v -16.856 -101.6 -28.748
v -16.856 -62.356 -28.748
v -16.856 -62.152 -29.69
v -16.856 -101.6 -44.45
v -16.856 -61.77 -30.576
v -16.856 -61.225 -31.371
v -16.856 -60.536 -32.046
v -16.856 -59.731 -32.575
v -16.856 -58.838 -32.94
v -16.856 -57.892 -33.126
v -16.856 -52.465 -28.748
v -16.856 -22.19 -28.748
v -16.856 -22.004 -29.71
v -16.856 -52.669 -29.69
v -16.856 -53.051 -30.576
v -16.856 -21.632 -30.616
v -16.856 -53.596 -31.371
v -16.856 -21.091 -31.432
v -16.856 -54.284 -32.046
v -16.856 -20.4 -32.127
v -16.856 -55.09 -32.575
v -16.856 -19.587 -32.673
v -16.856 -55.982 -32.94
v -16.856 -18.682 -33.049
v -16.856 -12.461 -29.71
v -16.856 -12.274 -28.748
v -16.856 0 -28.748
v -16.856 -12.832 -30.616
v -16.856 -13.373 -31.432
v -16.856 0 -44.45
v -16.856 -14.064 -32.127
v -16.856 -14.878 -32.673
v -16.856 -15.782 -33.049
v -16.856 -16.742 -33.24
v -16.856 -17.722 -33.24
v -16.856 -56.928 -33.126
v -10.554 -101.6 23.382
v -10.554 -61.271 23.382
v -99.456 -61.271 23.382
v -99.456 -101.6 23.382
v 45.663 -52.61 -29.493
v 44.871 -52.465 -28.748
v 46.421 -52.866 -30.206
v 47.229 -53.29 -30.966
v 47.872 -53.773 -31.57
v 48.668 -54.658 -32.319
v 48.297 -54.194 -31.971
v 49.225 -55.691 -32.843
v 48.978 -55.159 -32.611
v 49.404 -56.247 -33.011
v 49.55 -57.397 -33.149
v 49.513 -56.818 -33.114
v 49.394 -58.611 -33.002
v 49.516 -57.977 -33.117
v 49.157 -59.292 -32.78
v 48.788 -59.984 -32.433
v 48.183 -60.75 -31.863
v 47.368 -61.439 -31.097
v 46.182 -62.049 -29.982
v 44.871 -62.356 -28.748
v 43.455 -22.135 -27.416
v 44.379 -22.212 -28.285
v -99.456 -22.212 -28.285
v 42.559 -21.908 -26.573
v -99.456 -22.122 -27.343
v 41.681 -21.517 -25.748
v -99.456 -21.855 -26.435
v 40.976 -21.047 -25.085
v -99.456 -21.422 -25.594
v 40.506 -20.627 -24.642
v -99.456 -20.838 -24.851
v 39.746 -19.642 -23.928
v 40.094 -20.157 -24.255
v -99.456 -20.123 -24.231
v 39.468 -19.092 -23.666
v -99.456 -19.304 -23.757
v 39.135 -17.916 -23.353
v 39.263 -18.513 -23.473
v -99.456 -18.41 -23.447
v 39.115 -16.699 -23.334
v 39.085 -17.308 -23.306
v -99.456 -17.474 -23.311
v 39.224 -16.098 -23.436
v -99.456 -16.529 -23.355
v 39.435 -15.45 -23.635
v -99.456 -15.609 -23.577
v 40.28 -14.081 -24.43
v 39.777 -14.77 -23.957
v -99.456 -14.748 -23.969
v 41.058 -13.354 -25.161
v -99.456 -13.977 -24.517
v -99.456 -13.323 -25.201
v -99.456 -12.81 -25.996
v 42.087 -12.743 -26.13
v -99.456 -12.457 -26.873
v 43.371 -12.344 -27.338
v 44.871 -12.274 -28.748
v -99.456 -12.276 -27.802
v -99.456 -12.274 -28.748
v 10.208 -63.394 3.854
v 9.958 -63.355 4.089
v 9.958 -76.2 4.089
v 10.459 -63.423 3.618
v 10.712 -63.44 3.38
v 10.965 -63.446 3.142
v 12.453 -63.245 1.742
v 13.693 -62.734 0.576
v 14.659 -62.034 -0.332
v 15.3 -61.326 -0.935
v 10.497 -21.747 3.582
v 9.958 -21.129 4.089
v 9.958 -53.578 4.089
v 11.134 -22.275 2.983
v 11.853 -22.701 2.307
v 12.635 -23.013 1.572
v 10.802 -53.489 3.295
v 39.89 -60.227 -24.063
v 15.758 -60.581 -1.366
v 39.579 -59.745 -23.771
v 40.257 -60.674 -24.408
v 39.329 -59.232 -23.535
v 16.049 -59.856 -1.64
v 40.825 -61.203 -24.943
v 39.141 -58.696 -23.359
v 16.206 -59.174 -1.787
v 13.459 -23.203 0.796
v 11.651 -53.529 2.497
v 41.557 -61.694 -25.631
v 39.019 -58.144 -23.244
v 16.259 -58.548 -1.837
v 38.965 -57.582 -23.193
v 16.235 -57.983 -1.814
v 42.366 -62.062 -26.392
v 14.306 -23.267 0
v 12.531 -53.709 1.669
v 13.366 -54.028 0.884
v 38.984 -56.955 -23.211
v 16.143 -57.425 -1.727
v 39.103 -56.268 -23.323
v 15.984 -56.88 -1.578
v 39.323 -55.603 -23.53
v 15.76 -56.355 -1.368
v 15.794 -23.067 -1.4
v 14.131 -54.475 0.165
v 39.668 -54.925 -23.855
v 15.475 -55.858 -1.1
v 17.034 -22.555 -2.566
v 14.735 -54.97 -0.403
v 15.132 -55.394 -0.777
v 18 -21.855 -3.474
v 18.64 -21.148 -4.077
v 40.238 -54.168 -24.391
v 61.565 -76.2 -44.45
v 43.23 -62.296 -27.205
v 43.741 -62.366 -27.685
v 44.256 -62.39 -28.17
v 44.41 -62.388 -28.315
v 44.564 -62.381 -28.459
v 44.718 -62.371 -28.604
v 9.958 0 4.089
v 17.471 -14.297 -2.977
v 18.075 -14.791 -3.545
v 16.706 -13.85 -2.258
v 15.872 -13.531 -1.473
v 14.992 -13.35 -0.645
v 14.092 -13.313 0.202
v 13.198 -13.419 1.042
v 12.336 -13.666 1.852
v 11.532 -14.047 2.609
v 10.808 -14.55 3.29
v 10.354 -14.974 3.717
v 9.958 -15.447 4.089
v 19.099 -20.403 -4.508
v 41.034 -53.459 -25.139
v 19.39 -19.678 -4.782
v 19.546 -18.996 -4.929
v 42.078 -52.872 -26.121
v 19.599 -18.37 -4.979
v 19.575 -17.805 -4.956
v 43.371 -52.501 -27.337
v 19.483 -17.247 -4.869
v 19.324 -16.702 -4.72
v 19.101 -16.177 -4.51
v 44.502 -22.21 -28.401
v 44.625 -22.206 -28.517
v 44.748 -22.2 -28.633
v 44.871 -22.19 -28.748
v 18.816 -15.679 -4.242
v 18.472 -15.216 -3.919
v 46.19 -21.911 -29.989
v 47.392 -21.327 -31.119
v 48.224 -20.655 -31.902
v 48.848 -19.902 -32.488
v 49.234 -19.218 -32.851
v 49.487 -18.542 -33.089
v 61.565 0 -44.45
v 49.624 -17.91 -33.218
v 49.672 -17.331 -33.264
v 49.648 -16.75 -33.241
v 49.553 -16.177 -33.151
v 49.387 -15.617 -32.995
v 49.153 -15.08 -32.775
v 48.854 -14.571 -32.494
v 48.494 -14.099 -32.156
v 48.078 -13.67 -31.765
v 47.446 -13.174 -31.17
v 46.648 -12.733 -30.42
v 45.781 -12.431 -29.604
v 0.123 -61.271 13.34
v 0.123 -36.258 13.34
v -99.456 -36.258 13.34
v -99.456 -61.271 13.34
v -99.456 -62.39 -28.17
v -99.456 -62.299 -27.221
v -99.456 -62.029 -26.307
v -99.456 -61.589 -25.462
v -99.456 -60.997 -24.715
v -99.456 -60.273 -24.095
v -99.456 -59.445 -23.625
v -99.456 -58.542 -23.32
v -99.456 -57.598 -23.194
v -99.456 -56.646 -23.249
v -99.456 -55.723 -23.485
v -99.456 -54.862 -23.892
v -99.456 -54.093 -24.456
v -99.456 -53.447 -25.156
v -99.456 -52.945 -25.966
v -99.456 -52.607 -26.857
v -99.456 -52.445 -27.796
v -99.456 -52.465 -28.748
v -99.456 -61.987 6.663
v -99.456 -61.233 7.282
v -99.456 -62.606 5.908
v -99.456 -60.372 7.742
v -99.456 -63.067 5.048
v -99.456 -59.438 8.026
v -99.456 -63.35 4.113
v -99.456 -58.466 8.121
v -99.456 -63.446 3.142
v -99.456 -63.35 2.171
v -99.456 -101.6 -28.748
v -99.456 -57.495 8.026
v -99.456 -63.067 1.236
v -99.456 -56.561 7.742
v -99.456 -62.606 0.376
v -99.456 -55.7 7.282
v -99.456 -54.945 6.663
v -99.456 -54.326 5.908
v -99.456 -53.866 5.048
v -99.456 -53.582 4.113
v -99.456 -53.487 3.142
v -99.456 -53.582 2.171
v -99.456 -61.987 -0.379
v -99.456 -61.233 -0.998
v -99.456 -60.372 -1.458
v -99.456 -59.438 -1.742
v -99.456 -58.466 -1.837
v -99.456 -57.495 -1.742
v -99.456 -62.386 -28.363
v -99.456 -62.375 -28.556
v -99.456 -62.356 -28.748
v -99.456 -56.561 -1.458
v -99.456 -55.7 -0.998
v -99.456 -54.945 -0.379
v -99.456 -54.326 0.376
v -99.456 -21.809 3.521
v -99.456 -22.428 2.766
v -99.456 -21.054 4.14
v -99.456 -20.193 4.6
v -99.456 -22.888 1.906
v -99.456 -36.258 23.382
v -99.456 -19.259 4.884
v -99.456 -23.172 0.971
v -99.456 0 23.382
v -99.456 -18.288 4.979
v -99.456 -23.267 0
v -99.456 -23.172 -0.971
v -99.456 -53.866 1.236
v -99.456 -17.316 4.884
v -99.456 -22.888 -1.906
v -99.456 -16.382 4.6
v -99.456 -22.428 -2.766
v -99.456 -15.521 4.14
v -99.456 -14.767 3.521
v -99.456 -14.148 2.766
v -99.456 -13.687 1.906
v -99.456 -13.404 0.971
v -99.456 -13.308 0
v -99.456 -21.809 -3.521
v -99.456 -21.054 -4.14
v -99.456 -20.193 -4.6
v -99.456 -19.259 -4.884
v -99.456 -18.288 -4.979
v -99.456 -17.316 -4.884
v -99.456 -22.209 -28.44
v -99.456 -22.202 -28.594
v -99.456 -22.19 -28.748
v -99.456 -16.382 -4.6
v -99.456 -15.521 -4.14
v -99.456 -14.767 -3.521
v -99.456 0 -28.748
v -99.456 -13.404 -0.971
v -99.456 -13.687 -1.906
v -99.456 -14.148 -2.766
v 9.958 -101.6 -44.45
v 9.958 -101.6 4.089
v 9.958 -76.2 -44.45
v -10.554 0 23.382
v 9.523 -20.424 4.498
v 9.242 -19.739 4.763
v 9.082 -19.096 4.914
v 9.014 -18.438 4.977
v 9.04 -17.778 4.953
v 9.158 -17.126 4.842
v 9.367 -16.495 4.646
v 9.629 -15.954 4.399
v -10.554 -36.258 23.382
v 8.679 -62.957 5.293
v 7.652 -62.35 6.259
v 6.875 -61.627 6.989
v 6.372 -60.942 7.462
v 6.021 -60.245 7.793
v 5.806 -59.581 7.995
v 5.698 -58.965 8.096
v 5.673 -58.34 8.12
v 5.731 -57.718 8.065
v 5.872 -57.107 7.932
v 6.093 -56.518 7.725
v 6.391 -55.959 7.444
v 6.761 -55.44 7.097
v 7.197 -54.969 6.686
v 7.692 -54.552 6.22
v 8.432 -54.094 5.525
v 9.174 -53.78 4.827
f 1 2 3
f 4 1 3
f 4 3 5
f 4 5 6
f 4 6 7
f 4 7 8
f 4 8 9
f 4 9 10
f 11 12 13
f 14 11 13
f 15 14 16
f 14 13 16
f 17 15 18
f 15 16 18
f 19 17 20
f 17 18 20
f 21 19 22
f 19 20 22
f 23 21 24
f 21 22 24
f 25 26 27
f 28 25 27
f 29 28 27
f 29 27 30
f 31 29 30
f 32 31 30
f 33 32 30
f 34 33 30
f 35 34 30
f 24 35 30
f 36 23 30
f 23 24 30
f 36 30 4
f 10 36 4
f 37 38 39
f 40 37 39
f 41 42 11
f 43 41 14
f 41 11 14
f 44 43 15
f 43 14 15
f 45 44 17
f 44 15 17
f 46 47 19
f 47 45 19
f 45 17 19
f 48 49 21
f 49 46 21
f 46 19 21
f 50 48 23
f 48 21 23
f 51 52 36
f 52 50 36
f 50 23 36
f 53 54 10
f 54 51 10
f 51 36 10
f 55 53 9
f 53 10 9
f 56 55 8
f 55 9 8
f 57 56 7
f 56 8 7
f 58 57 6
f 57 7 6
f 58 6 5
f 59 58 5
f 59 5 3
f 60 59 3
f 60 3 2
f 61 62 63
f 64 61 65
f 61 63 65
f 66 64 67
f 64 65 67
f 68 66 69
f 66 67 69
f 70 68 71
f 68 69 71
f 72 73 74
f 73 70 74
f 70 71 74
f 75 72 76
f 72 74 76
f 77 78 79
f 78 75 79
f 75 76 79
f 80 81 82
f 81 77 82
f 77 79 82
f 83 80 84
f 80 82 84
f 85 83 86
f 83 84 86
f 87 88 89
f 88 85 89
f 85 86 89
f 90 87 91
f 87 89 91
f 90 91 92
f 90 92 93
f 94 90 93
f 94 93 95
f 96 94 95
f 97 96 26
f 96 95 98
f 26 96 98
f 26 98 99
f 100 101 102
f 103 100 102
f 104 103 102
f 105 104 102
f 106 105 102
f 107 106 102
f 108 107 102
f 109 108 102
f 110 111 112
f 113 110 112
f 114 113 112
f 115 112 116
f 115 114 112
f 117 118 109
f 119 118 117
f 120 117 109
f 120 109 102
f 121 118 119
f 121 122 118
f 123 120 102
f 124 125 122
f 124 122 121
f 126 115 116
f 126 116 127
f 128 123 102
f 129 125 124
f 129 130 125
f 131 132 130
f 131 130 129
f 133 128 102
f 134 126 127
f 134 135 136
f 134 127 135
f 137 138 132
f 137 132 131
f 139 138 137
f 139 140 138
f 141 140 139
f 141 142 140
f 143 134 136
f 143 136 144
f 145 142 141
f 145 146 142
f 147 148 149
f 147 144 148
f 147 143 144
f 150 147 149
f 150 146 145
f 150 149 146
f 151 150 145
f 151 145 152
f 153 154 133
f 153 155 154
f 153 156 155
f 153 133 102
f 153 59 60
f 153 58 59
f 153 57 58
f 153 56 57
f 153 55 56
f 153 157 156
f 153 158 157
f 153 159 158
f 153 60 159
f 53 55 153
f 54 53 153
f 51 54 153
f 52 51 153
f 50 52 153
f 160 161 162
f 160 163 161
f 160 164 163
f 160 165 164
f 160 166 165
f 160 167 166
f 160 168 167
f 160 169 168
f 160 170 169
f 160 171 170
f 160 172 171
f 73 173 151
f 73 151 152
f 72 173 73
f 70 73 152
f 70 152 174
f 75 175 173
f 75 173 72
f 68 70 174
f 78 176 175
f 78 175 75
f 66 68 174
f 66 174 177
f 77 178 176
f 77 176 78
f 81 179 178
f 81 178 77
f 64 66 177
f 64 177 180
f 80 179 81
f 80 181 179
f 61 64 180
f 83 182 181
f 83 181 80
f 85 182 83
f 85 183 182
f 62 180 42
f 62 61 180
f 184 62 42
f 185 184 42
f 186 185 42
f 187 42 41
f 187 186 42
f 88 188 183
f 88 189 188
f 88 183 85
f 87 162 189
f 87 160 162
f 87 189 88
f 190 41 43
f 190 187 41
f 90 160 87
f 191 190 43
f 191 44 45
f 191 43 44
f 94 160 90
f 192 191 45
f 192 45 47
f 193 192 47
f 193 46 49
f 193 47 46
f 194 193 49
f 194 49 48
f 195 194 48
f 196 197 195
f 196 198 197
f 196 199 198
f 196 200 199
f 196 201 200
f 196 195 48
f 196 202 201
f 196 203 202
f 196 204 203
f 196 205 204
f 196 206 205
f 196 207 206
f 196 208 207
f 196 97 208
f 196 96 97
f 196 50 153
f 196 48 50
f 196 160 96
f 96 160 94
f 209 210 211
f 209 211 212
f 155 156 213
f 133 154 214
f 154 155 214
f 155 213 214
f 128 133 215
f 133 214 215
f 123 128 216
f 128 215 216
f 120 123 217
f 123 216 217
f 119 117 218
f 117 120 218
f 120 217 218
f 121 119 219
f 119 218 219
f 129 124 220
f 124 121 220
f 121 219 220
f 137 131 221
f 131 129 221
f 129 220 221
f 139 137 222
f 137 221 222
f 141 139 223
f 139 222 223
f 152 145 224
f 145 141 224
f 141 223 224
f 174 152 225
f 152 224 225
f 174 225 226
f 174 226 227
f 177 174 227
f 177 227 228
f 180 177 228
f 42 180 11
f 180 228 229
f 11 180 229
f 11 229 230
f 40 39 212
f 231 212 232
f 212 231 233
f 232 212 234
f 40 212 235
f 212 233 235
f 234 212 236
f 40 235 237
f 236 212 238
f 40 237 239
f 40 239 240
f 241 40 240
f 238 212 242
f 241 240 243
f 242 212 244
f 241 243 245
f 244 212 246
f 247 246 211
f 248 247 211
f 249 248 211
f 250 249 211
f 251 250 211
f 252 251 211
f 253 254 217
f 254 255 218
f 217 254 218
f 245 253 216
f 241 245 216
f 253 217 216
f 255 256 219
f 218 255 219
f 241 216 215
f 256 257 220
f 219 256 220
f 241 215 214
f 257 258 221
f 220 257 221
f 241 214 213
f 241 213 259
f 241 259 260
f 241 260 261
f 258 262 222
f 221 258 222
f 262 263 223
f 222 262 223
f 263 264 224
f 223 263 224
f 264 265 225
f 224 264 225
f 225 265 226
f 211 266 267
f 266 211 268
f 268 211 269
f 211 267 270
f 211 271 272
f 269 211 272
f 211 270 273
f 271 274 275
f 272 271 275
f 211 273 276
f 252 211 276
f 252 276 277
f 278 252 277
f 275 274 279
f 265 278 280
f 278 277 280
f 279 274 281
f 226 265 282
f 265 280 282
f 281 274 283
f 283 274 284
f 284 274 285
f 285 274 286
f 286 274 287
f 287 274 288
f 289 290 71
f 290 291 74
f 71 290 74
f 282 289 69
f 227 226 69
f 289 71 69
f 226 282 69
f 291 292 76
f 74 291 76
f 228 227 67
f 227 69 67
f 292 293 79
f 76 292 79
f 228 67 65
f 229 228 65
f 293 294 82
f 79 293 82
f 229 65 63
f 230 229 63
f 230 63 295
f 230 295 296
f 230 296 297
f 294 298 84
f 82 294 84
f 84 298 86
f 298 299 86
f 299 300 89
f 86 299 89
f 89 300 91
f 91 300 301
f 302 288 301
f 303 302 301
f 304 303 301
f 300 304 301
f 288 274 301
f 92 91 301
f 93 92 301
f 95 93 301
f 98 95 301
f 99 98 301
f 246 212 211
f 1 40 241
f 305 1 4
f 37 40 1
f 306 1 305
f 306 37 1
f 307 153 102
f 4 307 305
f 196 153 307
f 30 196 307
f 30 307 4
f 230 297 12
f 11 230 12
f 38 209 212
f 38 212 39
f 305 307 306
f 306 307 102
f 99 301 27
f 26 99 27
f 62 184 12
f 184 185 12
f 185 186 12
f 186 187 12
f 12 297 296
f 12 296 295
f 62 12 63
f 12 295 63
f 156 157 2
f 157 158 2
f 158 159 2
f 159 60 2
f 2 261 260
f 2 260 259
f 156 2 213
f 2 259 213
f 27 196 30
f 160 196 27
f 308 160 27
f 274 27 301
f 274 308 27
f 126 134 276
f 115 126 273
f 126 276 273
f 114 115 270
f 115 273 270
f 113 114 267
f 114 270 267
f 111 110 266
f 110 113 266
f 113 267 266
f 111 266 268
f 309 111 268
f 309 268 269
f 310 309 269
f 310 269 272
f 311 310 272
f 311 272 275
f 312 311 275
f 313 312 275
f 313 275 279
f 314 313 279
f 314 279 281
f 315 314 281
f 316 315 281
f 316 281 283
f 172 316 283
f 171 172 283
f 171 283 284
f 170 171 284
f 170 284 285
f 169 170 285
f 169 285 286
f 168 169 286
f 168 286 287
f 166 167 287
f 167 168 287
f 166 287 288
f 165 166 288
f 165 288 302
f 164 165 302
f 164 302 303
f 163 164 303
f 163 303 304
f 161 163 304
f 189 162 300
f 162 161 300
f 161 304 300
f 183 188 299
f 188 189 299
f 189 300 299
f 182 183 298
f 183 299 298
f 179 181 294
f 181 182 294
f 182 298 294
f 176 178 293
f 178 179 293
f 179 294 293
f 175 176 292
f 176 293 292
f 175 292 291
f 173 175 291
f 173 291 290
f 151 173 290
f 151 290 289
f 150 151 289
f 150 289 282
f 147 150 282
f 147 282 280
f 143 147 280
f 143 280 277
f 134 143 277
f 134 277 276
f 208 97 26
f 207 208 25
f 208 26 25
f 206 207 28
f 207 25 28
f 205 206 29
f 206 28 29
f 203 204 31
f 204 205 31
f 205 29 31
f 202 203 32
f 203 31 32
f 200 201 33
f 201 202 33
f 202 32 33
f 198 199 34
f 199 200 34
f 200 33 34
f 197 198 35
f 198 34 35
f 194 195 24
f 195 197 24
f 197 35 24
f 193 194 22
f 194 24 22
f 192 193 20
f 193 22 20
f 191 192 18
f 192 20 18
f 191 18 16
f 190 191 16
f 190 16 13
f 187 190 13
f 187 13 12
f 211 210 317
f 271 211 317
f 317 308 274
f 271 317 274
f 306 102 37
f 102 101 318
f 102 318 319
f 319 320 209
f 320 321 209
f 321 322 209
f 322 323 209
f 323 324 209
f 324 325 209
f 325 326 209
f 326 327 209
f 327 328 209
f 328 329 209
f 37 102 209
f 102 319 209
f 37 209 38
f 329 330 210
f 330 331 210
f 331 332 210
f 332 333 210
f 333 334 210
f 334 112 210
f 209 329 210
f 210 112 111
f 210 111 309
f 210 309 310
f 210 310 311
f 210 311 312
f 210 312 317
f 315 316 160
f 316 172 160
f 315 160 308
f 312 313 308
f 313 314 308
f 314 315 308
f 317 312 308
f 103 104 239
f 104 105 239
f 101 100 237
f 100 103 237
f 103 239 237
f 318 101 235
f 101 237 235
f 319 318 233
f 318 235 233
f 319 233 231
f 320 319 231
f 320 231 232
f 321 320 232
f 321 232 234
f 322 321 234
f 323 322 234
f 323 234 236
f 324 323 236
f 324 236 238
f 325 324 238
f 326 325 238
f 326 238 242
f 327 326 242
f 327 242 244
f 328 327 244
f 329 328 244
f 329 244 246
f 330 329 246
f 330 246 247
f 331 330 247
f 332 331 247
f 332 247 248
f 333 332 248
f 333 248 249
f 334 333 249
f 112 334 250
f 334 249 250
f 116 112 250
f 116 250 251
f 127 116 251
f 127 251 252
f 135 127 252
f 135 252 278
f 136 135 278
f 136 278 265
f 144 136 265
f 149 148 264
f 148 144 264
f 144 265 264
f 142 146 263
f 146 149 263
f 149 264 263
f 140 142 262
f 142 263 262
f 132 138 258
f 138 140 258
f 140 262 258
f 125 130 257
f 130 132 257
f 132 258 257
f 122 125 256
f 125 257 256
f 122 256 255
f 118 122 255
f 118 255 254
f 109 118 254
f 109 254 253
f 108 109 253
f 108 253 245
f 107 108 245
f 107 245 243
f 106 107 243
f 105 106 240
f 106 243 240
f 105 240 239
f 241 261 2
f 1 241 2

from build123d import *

# Parameters (mm, degrees)
F1_DEPTH = 101.6
F3_DEPTH = 76.2
F4_W     = 25.0135893855
F4_H     = 20.0843550265
F5_DEPTH = 103.378
F6_R     = 4.9794966454
F7_DEPTH = 167.132


with BuildPart() as f1:
    # F0 (on Front) → F1 (new body)
    with BuildSketch(Plane.XZ):
        Polygon((-99.4555056095, 23.3819726855), (-99.4555056095, -18.3572731912), (-99.4555056095, -28.7481807172), (-16.8563630432, -28.7481807172), (-16.8563630432, -44.4500036538), (9.9582020193, -44.4500036538), (9.9582020193, 4.0893019177), (-10.5538228527, 23.3819726855), align=None)
    extrude(amount=F1_DEPTH)

    # F2 (on face) → F3 (join)
    with BuildSketch(Plane(origin=(0, 0, 0), x_dir=(-1, 0, 0), z_dir=(0, 1, 0))):
        Polygon((-9.9582020193, -44.4500036538), (-9.9582020193, 4.0893019177), (-61.5653358961, -44.4500036538), align=None)
    extrude(amount=-F3_DEPTH)

    # F4 (on face) → F5 (cut)
    with BuildSketch(Plane(origin=(-99.4555056095, 0, 0), x_dir=(0, -1, 0), z_dir=(-1, 0, 0))):
        with Locations((48.7646157427, 23.3819726855)):
            Rectangle(F4_W, F4_H)
    extrude(amount=-F5_DEPTH, mode=Mode.SUBTRACT)

    # F6 (on face) → F7 (cut)
    with BuildSketch(Plane(origin=(-99.4555056095, 0, 0), x_dir=(0, -1, 0), z_dir=(-1, 0, 0))):
        with Locations((18.2879269123, 0)):
            Circle(F6_R)
        with BuildLine():
            Line((62.3561588025, -28.7481807172), (52.4646214301, -28.7481807172))
            ThreePointArc((52.4646214301, -28.7481807172), (57.4103901163, -33.1490937952), (62.3561588025, -28.7481807172))
        make_face()
        with BuildLine():
            ThreePointArc((62.3898867617, -28.1695971498), (57.1206072149, -23.1985396455), (52.4646214301, -28.7481807172))
            Line((52.4646214301, -28.7481807172), (62.3561588025, -28.7481807172))
            ThreePointArc((62.3561588025, -28.7481807172), (62.3814476206, -28.4593800512), (62.3898867617, -28.1695971498))
        make_face()
        with Locations((58.4661085159, 3.1419980805)):
            Circle(F6_R)
        with BuildLine():
            Line((22.1901210724, -28.7481807172), (12.274295953, -28.7481807172))
            ThreePointArc((12.274295953, -28.7481807172), (17.2322085127, -33.264546828), (22.1901210724, -28.7481807172))
        make_face()
        with BuildLine():
            ThreePointArc((22.1901210724, -28.7481807172), (22.2063062098, -28.5168667938), (22.2117051581, -28.2850501826))
            ThreePointArc((22.2117051581, -28.2850501826), (17.0003919016, -23.3109524855), (12.274295953, -28.7481807172))
            Line((12.274295953, -28.7481807172), (22.1901210724, -28.7481807172))
        make_face()
    extrude(amount=-F7_DEPTH, mode=Mode.SUBTRACT)


solid = f1.part
